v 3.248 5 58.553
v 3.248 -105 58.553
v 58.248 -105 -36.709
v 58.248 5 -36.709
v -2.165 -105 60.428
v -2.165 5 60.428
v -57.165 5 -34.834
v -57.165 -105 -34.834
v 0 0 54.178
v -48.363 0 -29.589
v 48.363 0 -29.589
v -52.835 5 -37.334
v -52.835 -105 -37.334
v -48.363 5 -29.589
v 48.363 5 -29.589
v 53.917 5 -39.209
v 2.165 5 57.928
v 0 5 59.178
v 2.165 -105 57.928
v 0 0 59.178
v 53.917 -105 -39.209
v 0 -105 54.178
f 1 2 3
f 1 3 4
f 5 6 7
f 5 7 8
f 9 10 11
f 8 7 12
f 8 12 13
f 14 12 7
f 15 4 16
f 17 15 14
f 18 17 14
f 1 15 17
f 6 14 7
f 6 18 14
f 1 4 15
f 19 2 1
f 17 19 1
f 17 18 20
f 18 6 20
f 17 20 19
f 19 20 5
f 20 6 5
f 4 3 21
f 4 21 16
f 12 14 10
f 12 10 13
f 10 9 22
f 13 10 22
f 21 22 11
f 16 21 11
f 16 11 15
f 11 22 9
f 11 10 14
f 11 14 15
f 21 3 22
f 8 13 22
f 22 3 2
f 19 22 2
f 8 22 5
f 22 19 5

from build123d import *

# Parameters (mm, degrees)
F1_DEPTH = 5
F2_W     = 110
F2_H     = 110
F3_DEPTH = 2.5
F4_W     = 110
F4_H     = 110
F5_DEPTH = 2.5


with BuildPart() as f1:
    # F0 (on Front) → F1 (new body)
    with BuildSketch(Plane.XZ):
        Polygon((51.25, -29.589201), (0, 59.178403), (-51.25, -29.589201), align=None)
    extrude(amount=-F1_DEPTH)

    # F2 (on face) → F3 (join, symmetric)
    with BuildSketch(Plane(origin=(-25.625, 0, 14.794601), x_dir=(0, -1, 0), z_dir=(-0.866025, 0, 0.5))):
        with Locations((50, -3.75)):
            Rectangle(F2_W, F2_H)
    extrude(amount=F3_DEPTH, both=True)

    # F4 (on face) → F5 (join, symmetric)
    with BuildSketch(Plane(origin=(25.625, 0, 14.794601), x_dir=(0, 1, 0), z_dir=(0.866025, 0, 0.5))):
        with Locations((-50, -5.915064)):
            Rectangle(F4_W, F4_H)
    extrude(amount=F5_DEPTH, both=True)


solid = f1.part
